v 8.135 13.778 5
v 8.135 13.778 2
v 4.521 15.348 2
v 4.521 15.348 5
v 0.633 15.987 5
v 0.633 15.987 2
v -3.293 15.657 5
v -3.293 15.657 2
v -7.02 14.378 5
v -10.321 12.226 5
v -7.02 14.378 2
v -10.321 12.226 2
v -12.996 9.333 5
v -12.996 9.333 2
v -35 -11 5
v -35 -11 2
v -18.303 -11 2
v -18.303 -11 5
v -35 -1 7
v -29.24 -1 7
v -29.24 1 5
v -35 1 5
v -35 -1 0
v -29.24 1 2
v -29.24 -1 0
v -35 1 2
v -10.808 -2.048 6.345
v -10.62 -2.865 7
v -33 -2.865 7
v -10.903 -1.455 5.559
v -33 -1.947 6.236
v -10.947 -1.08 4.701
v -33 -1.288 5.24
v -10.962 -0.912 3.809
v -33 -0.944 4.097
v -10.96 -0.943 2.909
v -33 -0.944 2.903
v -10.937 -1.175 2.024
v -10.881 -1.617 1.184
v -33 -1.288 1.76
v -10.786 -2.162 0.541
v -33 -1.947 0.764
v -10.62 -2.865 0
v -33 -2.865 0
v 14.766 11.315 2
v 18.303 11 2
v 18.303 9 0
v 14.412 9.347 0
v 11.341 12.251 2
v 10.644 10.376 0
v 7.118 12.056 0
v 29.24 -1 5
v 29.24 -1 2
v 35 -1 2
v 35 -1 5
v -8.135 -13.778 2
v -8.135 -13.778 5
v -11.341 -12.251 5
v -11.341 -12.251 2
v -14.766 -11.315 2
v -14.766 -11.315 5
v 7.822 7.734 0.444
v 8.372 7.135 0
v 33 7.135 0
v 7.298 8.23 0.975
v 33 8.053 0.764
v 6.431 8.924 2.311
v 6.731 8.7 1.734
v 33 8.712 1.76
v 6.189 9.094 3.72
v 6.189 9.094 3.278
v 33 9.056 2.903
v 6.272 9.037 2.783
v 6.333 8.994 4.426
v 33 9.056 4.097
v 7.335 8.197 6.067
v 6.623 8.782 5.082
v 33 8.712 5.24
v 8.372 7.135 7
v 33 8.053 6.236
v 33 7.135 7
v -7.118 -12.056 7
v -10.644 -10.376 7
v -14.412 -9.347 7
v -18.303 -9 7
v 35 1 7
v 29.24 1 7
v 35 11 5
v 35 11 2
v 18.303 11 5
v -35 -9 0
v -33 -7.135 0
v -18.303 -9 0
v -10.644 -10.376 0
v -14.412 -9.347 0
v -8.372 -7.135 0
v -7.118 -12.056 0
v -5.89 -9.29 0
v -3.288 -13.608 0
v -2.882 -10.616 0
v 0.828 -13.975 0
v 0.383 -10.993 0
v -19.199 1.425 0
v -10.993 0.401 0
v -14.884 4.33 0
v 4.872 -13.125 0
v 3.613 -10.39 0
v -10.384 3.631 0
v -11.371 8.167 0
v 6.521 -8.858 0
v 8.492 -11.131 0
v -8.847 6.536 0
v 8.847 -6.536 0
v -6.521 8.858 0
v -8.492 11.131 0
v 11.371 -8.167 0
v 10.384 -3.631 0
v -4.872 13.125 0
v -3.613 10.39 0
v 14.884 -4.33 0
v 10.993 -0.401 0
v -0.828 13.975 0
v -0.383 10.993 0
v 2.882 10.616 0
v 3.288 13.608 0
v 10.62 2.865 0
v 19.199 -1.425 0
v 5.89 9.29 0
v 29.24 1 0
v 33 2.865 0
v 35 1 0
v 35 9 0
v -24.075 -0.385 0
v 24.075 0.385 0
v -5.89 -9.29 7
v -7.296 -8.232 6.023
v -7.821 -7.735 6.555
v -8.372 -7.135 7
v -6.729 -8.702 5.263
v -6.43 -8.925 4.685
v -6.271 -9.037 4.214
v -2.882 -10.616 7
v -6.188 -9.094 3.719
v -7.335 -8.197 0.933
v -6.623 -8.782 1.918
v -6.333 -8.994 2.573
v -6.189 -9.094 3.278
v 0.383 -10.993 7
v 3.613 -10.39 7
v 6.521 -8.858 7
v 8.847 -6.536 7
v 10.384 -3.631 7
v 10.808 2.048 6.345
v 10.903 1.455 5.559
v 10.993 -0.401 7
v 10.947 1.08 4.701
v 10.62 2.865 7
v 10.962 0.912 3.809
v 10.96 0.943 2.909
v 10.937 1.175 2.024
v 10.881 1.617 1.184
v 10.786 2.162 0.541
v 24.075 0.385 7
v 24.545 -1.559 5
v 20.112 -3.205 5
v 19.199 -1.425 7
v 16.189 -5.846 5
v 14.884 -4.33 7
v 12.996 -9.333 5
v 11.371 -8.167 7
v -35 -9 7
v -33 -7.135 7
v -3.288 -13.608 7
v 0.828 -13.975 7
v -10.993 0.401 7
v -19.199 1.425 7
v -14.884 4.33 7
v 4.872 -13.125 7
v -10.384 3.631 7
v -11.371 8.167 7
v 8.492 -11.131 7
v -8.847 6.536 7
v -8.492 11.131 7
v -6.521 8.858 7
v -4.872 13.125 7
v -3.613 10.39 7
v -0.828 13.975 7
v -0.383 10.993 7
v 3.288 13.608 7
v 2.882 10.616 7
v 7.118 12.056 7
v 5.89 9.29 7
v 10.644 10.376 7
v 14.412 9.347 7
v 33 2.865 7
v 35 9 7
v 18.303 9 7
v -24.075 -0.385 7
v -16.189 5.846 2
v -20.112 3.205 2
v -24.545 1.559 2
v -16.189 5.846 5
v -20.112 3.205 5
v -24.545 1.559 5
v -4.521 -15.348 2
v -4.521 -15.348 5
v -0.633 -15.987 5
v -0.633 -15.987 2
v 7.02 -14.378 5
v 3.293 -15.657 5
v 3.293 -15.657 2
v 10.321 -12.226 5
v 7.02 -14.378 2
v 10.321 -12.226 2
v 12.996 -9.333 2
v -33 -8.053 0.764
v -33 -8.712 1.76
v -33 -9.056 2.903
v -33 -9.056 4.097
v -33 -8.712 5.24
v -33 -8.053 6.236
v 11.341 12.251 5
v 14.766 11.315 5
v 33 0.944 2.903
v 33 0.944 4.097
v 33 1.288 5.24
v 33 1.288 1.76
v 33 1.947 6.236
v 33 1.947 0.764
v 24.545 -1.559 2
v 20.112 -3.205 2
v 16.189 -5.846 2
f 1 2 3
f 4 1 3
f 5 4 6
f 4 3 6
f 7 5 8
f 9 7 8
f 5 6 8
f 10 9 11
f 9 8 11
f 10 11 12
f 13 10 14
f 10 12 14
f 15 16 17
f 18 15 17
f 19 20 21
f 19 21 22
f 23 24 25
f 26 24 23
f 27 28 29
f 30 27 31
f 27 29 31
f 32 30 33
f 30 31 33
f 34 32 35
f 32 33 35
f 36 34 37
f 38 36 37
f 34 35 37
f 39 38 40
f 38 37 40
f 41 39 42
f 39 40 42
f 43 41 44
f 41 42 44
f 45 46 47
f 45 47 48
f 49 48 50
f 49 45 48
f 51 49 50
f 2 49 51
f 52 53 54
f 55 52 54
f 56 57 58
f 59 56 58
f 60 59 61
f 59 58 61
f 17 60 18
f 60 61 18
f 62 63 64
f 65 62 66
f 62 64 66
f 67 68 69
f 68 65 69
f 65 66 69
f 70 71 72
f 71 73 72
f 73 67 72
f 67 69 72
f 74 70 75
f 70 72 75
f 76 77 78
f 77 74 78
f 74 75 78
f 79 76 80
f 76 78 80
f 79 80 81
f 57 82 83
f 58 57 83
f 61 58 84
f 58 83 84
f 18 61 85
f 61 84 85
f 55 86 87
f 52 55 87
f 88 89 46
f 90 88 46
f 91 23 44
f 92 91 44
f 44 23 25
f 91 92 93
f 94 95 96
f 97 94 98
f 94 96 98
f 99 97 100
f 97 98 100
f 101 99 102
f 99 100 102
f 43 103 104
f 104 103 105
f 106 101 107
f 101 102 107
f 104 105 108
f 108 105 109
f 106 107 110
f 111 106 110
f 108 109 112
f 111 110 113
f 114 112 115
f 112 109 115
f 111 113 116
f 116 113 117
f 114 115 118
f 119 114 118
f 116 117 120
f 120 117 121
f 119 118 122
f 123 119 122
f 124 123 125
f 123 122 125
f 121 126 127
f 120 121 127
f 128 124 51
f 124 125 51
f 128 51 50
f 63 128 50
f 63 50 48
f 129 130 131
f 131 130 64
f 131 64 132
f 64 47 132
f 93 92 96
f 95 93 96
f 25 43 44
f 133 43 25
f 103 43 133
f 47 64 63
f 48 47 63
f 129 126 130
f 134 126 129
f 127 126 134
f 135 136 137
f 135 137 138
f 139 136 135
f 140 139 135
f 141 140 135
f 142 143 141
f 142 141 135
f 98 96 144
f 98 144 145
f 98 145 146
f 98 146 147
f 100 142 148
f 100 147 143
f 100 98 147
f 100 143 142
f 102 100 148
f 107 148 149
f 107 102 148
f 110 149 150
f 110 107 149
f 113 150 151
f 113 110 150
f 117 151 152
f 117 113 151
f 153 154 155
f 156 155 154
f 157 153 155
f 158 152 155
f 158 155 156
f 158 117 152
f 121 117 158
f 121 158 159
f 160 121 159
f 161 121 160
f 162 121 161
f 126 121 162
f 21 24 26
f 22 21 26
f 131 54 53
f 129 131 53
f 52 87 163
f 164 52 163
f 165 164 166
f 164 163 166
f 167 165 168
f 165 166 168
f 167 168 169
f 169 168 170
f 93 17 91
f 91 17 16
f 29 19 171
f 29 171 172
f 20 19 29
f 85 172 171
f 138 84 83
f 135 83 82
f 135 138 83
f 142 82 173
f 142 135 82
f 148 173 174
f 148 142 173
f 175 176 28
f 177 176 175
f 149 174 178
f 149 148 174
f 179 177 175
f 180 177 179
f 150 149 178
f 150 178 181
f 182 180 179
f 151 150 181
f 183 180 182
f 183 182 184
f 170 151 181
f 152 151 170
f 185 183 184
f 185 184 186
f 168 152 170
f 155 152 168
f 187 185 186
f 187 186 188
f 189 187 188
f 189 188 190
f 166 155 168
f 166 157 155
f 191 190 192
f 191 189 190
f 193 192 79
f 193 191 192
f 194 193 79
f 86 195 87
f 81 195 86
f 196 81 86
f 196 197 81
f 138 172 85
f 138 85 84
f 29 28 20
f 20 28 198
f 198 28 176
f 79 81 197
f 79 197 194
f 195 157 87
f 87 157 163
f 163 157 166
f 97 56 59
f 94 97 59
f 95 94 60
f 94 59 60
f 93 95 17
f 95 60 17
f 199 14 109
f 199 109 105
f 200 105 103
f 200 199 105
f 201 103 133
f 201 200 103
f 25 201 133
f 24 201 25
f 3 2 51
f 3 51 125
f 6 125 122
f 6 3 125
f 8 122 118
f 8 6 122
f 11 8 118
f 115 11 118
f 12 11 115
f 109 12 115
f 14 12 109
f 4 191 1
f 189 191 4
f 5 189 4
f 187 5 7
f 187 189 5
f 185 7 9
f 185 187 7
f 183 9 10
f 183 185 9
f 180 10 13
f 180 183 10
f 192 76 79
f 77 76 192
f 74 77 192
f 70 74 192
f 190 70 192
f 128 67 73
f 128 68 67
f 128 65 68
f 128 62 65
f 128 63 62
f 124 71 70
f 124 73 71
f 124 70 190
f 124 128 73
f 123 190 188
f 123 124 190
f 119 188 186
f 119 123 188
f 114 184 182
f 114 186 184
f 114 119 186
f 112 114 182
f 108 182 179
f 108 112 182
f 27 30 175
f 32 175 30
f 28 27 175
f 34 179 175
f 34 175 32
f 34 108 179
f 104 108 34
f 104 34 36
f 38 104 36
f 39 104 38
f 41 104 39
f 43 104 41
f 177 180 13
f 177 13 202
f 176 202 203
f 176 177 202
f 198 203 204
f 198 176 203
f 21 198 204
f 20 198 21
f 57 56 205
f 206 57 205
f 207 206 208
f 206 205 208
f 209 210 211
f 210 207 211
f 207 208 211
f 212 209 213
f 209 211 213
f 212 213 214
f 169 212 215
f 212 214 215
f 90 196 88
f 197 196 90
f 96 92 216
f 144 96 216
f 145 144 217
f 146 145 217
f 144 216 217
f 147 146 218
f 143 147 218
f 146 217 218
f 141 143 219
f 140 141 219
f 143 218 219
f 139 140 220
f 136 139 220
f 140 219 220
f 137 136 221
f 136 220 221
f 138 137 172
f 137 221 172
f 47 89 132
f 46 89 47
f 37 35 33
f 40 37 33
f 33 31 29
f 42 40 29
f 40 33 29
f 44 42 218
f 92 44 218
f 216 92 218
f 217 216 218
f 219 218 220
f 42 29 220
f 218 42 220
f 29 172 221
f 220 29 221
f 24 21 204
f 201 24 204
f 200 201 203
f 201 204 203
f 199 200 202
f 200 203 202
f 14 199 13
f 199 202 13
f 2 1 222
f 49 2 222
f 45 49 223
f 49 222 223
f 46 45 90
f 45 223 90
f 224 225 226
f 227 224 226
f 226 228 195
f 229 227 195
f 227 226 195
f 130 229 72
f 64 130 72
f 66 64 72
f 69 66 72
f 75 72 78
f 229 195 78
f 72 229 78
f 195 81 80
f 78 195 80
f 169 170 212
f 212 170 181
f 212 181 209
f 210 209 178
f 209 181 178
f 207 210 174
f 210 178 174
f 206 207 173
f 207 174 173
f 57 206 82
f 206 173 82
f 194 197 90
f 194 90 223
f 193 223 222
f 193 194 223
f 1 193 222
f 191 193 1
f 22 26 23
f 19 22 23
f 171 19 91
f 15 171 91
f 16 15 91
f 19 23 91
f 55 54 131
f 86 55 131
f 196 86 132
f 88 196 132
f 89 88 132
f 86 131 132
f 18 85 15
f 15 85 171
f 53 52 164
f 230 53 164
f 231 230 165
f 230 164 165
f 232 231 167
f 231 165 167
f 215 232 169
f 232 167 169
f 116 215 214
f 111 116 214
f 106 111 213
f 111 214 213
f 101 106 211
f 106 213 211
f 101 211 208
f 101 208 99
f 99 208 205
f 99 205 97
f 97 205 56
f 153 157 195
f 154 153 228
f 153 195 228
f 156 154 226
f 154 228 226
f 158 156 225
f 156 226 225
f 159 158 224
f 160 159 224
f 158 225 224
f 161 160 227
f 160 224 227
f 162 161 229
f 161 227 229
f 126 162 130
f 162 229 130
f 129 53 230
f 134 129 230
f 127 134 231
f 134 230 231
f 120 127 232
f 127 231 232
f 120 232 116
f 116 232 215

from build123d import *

# Parameters (mm, degrees)
F0_R     = 11
F1_DEPTH = 7
F2_R     = 4.1
F3_DEPTH = 28.8211942778
F4_R     = 4.1
F5_DEPTH = 28.8211942778
F6_W     = 12
F6_H     = 7
F7_DEPTH = 2
F8_W     = 12
F8_H     = 7
F9_DEPTH = 2
F10_R    = 20
F11_SIZE = 2


# Not quite as in the source:
# - a feature names something its author has since deleted; it is built from what else it names


with BuildPart() as f1:
    # F0 (on Top) → F1 (new body)
    with BuildSketch(Plane.XY):
        with BuildLine():
            Line((35, 11), (11.6189500386, 11))
            ThreePointArc((11.6189500386, 11), (-5.4525336701, 15.0422696617), (-15.9687194227, 1))
            Line((-15.9687194227, 1), (-35, 1))
            Line((-35, 1), (-35, -11))
            Line((-35, -11), (-11.6189500386, -11))
            ThreePointArc((-11.6189500386, -11), (5.4525336701, -15.0422696617), (15.9687194227, -1))
            Line((15.9687194227, -1), (35, -1))
            Line((35, -1), (35, 11))
        make_face()
        Circle(F0_R, mode=Mode.SUBTRACT)
    extrude(amount=F1_DEPTH)

    # F2 (on face) → F3 (cut, through all)
    with BuildSketch(Plane.YZ.offset(35)):
        with Locations((5, 3.5)):
            Circle(F2_R)
    extrude(amount=-F3_DEPTH, mode=Mode.SUBTRACT)

    # F4 (on face) → F5 (cut, through all)
    with BuildSketch(Plane(origin=(-35, 0, 0), x_dir=(0, -1, 0), z_dir=(-1, 0, 0))):
        with Locations((5, 3.5)):
            Circle(F4_R)
    extrude(amount=-F5_DEPTH, mode=Mode.SUBTRACT)

    # F6 (on face) → F7 (join)
    with BuildSketch(Plane.YZ.offset(35)):
        with Locations((5, 3.5)):
            Rectangle(F6_W, F6_H)
    extrude(amount=-F7_DEPTH)

    # F8 (on face) → F9 (join)
    with BuildSketch(Plane(origin=(-35, 0, 0), x_dir=(0, -1, 0), z_dir=(-1, 0, 0))):
        with Locations((5, 3.5)):
            Rectangle(F8_W, F8_H)
    extrude(amount=-F9_DEPTH)

    # F10
    f10_edges = [f1.edges().sort_by_distance(p)[0] for p in [
        (11.61895, 11, 3.5),
        (-15.968719, 1, 3.5),
        (15.968719, -1, 3.5),
        (-11.61895, -11, 3.5),
    ]]
    fillet(f10_edges, radius=F10_R)

    # F11
    f11_edges = [f1.edges().sort_by_distance(p)[0] for p in [
        (-26.651503, -11, 7),
        (32.120192, -1, 7),
        (-3.293287, 15.657403, 7),
        (-32.120192, 1, 7),
        (32.120192, -1, 0),
        (-3.293287, 15.657403, 0),
        (-26.651503, -11, 0),
        (-32.120192, 1, 0),
    ]]
    chamfer(f11_edges, length=F11_SIZE)


solid = f1.part
